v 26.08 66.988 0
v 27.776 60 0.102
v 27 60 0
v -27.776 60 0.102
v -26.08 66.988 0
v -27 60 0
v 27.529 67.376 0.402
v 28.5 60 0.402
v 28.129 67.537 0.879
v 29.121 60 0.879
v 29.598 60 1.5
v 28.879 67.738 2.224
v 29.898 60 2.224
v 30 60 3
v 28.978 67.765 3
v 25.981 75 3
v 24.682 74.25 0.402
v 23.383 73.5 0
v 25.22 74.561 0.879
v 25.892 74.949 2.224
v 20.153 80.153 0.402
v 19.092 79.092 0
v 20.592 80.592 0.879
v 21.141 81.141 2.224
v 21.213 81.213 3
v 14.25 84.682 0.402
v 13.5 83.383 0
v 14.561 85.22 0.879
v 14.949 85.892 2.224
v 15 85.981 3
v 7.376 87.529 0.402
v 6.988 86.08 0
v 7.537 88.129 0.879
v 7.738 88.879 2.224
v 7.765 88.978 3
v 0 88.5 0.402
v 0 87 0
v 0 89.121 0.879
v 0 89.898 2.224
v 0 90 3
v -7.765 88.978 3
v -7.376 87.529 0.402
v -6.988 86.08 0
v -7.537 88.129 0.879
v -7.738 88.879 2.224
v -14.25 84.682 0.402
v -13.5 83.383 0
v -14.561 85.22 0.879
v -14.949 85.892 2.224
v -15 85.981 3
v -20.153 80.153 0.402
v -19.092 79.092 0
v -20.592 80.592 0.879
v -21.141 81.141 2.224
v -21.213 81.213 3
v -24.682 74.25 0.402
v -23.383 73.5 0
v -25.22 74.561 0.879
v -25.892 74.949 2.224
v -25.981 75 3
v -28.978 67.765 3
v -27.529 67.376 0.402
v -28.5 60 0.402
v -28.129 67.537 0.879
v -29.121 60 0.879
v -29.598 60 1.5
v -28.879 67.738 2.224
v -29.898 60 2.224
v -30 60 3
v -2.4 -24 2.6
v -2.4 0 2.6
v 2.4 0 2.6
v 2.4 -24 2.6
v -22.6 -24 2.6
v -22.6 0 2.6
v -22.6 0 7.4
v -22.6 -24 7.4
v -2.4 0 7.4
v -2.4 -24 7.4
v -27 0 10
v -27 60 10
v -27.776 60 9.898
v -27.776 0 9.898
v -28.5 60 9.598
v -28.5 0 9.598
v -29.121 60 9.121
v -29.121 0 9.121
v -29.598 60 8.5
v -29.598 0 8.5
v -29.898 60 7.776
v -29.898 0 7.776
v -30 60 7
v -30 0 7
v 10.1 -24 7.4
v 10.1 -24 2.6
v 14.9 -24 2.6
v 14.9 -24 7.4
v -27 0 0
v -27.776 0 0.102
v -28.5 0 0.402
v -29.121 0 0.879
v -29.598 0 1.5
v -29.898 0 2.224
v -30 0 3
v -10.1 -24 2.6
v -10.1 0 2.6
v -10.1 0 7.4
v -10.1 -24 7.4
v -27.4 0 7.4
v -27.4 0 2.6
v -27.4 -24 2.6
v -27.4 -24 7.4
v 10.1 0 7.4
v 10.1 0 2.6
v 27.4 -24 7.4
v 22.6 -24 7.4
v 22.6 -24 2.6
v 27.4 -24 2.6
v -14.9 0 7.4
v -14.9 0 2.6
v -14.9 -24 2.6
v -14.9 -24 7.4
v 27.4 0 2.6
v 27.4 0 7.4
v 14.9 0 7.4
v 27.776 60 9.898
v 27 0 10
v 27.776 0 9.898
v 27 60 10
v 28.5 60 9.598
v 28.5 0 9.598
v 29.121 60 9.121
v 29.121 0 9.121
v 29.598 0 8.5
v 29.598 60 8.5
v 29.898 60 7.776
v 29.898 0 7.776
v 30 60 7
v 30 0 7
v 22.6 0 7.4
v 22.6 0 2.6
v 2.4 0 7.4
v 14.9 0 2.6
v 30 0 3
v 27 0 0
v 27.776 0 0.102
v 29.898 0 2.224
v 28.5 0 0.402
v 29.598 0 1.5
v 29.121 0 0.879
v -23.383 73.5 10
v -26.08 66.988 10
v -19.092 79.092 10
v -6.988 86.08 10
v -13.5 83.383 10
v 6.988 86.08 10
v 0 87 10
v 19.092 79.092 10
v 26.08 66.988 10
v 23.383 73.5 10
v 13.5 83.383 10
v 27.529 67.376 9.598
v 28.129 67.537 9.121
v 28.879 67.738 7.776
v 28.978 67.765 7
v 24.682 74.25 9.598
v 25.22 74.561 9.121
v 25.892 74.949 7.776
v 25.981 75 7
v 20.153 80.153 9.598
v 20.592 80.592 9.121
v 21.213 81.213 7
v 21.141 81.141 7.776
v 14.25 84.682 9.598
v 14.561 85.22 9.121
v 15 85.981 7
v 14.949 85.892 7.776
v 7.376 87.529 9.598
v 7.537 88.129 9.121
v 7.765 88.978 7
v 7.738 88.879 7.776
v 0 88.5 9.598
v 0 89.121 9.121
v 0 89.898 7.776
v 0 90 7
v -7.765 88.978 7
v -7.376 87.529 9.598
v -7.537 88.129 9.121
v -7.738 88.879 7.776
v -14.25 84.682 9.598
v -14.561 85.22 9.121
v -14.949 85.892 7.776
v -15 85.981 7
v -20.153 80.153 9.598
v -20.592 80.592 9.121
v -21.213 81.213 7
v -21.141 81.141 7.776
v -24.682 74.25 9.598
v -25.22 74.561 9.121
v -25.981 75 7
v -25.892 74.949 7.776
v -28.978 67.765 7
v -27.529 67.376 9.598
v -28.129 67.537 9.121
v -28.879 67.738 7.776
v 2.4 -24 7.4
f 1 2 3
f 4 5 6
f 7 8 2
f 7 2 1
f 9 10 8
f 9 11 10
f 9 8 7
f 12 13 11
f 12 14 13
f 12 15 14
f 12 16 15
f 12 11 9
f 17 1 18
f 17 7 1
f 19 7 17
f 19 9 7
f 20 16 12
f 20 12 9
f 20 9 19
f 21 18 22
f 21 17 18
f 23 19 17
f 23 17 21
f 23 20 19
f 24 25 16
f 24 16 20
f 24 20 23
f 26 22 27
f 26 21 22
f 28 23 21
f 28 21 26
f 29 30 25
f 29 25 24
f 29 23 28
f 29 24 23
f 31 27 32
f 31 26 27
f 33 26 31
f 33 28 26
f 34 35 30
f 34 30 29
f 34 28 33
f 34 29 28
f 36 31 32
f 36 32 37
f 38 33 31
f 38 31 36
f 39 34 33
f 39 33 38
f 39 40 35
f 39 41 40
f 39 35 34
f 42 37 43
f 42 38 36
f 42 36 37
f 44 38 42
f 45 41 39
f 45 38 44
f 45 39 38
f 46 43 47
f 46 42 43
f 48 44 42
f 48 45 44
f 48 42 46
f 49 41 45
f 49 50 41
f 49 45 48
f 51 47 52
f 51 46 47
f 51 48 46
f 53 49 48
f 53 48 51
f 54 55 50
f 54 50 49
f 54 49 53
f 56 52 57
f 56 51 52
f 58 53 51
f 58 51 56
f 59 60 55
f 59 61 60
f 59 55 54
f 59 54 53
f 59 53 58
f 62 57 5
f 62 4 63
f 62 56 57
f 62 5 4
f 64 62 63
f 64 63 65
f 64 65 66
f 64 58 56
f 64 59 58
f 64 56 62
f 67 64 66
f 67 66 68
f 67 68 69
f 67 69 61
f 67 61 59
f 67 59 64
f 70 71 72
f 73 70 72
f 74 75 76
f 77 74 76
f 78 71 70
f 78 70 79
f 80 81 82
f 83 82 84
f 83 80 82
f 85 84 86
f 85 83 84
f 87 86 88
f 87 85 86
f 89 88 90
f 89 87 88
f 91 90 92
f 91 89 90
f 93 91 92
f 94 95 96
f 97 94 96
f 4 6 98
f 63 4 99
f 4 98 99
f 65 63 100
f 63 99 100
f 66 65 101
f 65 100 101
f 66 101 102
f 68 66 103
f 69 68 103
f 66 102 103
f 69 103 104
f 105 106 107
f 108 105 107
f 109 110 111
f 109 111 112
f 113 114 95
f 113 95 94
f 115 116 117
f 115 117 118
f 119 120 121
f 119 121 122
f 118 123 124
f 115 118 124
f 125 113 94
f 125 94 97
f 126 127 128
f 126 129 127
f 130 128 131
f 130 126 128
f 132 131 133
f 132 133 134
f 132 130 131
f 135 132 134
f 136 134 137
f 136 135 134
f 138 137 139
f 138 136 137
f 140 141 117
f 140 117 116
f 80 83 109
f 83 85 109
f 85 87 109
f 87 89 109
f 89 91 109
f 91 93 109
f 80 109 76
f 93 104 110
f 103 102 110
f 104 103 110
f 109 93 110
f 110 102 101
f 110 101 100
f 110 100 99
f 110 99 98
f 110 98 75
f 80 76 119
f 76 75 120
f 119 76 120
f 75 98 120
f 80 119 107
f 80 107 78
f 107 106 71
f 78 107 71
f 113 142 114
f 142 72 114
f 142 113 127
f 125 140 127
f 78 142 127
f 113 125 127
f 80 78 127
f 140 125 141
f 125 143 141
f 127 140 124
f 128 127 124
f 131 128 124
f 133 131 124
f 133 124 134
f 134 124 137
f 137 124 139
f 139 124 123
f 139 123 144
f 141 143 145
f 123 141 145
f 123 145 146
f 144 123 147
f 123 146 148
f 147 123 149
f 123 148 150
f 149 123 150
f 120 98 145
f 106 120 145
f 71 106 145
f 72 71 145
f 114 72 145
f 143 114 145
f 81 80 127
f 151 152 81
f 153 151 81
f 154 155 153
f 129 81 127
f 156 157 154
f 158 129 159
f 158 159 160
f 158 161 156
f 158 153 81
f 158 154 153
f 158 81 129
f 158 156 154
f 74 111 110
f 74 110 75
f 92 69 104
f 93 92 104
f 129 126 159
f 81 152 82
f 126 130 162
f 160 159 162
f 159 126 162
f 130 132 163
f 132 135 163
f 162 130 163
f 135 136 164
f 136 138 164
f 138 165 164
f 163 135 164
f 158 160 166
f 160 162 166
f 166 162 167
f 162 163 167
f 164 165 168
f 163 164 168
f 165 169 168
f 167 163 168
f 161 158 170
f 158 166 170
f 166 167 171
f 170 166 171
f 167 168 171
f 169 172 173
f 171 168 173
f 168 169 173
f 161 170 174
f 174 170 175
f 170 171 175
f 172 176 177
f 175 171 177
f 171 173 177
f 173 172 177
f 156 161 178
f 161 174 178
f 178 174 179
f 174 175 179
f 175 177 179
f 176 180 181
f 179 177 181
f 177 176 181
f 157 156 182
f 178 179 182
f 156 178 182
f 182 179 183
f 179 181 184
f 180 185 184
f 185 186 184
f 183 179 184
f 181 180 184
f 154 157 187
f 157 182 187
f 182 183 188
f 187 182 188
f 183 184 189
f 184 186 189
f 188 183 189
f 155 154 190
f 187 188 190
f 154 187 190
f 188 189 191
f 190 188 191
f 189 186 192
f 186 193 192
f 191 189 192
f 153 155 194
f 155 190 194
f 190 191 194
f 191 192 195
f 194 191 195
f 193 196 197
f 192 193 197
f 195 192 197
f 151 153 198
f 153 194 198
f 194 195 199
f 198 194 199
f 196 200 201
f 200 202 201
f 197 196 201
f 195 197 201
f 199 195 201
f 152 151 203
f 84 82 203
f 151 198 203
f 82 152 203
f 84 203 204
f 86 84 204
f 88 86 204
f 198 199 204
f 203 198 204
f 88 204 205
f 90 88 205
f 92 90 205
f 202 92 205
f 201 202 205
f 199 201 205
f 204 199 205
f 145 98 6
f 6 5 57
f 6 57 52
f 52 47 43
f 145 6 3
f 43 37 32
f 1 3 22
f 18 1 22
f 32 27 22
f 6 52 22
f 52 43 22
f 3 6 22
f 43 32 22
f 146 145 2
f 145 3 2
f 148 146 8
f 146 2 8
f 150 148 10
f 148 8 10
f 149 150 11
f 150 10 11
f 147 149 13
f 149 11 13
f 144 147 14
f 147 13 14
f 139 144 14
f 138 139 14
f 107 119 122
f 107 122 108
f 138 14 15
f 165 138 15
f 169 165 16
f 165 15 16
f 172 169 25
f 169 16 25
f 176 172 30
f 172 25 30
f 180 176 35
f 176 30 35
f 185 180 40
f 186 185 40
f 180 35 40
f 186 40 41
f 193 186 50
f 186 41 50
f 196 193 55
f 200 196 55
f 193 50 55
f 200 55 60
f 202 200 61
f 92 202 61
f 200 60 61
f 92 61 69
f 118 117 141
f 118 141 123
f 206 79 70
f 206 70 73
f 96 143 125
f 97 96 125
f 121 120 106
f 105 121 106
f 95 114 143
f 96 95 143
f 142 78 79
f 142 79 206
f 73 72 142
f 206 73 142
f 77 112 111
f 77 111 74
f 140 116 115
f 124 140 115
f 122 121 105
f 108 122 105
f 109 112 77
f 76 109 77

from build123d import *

# Parameters (mm, degrees)
F1_DEPTH = 10
F2_W     = 4.8
F2_H     = 4.8
F3_DEPTH = 24
F4_R     = 3


with BuildPart() as f1:
    # F0 (on Top) → F1 (new body)
    with BuildSketch(Plane.XY):
        with BuildLine():
            Line((-30, 0), (30, 0))
            Line((30, 0), (30, 60))
            ThreePointArc((30, 60), (0, 90), (-30, 60))
            Line((-30, 60), (-30, 0))
        make_face()
    extrude(amount=F1_DEPTH)

    # F2 (on face) → F3 (join)
    with BuildSketch(Plane.XZ):
        with Locations((-25, 5)):
            Rectangle(F2_W, F2_H)
        with Locations((-12.5, 5)):
            Rectangle(F2_W, F2_H)
        with Locations((0, 5)):
            Rectangle(F2_W, F2_H)
        with Locations((12.5, 5)):
            Rectangle(F2_W, F2_H)
        with Locations((25, 5)):
            Rectangle(F2_W, F2_H)
    extrude(amount=F3_DEPTH)

    # F4
    f4_edges = [f1.edges().sort_by_distance(p)[0] for p in [
        (30, 30, 10),
        (30, 30, 0),
    ]]
    fillet(f4_edges, radius=F4_R)


solid = f1.part
